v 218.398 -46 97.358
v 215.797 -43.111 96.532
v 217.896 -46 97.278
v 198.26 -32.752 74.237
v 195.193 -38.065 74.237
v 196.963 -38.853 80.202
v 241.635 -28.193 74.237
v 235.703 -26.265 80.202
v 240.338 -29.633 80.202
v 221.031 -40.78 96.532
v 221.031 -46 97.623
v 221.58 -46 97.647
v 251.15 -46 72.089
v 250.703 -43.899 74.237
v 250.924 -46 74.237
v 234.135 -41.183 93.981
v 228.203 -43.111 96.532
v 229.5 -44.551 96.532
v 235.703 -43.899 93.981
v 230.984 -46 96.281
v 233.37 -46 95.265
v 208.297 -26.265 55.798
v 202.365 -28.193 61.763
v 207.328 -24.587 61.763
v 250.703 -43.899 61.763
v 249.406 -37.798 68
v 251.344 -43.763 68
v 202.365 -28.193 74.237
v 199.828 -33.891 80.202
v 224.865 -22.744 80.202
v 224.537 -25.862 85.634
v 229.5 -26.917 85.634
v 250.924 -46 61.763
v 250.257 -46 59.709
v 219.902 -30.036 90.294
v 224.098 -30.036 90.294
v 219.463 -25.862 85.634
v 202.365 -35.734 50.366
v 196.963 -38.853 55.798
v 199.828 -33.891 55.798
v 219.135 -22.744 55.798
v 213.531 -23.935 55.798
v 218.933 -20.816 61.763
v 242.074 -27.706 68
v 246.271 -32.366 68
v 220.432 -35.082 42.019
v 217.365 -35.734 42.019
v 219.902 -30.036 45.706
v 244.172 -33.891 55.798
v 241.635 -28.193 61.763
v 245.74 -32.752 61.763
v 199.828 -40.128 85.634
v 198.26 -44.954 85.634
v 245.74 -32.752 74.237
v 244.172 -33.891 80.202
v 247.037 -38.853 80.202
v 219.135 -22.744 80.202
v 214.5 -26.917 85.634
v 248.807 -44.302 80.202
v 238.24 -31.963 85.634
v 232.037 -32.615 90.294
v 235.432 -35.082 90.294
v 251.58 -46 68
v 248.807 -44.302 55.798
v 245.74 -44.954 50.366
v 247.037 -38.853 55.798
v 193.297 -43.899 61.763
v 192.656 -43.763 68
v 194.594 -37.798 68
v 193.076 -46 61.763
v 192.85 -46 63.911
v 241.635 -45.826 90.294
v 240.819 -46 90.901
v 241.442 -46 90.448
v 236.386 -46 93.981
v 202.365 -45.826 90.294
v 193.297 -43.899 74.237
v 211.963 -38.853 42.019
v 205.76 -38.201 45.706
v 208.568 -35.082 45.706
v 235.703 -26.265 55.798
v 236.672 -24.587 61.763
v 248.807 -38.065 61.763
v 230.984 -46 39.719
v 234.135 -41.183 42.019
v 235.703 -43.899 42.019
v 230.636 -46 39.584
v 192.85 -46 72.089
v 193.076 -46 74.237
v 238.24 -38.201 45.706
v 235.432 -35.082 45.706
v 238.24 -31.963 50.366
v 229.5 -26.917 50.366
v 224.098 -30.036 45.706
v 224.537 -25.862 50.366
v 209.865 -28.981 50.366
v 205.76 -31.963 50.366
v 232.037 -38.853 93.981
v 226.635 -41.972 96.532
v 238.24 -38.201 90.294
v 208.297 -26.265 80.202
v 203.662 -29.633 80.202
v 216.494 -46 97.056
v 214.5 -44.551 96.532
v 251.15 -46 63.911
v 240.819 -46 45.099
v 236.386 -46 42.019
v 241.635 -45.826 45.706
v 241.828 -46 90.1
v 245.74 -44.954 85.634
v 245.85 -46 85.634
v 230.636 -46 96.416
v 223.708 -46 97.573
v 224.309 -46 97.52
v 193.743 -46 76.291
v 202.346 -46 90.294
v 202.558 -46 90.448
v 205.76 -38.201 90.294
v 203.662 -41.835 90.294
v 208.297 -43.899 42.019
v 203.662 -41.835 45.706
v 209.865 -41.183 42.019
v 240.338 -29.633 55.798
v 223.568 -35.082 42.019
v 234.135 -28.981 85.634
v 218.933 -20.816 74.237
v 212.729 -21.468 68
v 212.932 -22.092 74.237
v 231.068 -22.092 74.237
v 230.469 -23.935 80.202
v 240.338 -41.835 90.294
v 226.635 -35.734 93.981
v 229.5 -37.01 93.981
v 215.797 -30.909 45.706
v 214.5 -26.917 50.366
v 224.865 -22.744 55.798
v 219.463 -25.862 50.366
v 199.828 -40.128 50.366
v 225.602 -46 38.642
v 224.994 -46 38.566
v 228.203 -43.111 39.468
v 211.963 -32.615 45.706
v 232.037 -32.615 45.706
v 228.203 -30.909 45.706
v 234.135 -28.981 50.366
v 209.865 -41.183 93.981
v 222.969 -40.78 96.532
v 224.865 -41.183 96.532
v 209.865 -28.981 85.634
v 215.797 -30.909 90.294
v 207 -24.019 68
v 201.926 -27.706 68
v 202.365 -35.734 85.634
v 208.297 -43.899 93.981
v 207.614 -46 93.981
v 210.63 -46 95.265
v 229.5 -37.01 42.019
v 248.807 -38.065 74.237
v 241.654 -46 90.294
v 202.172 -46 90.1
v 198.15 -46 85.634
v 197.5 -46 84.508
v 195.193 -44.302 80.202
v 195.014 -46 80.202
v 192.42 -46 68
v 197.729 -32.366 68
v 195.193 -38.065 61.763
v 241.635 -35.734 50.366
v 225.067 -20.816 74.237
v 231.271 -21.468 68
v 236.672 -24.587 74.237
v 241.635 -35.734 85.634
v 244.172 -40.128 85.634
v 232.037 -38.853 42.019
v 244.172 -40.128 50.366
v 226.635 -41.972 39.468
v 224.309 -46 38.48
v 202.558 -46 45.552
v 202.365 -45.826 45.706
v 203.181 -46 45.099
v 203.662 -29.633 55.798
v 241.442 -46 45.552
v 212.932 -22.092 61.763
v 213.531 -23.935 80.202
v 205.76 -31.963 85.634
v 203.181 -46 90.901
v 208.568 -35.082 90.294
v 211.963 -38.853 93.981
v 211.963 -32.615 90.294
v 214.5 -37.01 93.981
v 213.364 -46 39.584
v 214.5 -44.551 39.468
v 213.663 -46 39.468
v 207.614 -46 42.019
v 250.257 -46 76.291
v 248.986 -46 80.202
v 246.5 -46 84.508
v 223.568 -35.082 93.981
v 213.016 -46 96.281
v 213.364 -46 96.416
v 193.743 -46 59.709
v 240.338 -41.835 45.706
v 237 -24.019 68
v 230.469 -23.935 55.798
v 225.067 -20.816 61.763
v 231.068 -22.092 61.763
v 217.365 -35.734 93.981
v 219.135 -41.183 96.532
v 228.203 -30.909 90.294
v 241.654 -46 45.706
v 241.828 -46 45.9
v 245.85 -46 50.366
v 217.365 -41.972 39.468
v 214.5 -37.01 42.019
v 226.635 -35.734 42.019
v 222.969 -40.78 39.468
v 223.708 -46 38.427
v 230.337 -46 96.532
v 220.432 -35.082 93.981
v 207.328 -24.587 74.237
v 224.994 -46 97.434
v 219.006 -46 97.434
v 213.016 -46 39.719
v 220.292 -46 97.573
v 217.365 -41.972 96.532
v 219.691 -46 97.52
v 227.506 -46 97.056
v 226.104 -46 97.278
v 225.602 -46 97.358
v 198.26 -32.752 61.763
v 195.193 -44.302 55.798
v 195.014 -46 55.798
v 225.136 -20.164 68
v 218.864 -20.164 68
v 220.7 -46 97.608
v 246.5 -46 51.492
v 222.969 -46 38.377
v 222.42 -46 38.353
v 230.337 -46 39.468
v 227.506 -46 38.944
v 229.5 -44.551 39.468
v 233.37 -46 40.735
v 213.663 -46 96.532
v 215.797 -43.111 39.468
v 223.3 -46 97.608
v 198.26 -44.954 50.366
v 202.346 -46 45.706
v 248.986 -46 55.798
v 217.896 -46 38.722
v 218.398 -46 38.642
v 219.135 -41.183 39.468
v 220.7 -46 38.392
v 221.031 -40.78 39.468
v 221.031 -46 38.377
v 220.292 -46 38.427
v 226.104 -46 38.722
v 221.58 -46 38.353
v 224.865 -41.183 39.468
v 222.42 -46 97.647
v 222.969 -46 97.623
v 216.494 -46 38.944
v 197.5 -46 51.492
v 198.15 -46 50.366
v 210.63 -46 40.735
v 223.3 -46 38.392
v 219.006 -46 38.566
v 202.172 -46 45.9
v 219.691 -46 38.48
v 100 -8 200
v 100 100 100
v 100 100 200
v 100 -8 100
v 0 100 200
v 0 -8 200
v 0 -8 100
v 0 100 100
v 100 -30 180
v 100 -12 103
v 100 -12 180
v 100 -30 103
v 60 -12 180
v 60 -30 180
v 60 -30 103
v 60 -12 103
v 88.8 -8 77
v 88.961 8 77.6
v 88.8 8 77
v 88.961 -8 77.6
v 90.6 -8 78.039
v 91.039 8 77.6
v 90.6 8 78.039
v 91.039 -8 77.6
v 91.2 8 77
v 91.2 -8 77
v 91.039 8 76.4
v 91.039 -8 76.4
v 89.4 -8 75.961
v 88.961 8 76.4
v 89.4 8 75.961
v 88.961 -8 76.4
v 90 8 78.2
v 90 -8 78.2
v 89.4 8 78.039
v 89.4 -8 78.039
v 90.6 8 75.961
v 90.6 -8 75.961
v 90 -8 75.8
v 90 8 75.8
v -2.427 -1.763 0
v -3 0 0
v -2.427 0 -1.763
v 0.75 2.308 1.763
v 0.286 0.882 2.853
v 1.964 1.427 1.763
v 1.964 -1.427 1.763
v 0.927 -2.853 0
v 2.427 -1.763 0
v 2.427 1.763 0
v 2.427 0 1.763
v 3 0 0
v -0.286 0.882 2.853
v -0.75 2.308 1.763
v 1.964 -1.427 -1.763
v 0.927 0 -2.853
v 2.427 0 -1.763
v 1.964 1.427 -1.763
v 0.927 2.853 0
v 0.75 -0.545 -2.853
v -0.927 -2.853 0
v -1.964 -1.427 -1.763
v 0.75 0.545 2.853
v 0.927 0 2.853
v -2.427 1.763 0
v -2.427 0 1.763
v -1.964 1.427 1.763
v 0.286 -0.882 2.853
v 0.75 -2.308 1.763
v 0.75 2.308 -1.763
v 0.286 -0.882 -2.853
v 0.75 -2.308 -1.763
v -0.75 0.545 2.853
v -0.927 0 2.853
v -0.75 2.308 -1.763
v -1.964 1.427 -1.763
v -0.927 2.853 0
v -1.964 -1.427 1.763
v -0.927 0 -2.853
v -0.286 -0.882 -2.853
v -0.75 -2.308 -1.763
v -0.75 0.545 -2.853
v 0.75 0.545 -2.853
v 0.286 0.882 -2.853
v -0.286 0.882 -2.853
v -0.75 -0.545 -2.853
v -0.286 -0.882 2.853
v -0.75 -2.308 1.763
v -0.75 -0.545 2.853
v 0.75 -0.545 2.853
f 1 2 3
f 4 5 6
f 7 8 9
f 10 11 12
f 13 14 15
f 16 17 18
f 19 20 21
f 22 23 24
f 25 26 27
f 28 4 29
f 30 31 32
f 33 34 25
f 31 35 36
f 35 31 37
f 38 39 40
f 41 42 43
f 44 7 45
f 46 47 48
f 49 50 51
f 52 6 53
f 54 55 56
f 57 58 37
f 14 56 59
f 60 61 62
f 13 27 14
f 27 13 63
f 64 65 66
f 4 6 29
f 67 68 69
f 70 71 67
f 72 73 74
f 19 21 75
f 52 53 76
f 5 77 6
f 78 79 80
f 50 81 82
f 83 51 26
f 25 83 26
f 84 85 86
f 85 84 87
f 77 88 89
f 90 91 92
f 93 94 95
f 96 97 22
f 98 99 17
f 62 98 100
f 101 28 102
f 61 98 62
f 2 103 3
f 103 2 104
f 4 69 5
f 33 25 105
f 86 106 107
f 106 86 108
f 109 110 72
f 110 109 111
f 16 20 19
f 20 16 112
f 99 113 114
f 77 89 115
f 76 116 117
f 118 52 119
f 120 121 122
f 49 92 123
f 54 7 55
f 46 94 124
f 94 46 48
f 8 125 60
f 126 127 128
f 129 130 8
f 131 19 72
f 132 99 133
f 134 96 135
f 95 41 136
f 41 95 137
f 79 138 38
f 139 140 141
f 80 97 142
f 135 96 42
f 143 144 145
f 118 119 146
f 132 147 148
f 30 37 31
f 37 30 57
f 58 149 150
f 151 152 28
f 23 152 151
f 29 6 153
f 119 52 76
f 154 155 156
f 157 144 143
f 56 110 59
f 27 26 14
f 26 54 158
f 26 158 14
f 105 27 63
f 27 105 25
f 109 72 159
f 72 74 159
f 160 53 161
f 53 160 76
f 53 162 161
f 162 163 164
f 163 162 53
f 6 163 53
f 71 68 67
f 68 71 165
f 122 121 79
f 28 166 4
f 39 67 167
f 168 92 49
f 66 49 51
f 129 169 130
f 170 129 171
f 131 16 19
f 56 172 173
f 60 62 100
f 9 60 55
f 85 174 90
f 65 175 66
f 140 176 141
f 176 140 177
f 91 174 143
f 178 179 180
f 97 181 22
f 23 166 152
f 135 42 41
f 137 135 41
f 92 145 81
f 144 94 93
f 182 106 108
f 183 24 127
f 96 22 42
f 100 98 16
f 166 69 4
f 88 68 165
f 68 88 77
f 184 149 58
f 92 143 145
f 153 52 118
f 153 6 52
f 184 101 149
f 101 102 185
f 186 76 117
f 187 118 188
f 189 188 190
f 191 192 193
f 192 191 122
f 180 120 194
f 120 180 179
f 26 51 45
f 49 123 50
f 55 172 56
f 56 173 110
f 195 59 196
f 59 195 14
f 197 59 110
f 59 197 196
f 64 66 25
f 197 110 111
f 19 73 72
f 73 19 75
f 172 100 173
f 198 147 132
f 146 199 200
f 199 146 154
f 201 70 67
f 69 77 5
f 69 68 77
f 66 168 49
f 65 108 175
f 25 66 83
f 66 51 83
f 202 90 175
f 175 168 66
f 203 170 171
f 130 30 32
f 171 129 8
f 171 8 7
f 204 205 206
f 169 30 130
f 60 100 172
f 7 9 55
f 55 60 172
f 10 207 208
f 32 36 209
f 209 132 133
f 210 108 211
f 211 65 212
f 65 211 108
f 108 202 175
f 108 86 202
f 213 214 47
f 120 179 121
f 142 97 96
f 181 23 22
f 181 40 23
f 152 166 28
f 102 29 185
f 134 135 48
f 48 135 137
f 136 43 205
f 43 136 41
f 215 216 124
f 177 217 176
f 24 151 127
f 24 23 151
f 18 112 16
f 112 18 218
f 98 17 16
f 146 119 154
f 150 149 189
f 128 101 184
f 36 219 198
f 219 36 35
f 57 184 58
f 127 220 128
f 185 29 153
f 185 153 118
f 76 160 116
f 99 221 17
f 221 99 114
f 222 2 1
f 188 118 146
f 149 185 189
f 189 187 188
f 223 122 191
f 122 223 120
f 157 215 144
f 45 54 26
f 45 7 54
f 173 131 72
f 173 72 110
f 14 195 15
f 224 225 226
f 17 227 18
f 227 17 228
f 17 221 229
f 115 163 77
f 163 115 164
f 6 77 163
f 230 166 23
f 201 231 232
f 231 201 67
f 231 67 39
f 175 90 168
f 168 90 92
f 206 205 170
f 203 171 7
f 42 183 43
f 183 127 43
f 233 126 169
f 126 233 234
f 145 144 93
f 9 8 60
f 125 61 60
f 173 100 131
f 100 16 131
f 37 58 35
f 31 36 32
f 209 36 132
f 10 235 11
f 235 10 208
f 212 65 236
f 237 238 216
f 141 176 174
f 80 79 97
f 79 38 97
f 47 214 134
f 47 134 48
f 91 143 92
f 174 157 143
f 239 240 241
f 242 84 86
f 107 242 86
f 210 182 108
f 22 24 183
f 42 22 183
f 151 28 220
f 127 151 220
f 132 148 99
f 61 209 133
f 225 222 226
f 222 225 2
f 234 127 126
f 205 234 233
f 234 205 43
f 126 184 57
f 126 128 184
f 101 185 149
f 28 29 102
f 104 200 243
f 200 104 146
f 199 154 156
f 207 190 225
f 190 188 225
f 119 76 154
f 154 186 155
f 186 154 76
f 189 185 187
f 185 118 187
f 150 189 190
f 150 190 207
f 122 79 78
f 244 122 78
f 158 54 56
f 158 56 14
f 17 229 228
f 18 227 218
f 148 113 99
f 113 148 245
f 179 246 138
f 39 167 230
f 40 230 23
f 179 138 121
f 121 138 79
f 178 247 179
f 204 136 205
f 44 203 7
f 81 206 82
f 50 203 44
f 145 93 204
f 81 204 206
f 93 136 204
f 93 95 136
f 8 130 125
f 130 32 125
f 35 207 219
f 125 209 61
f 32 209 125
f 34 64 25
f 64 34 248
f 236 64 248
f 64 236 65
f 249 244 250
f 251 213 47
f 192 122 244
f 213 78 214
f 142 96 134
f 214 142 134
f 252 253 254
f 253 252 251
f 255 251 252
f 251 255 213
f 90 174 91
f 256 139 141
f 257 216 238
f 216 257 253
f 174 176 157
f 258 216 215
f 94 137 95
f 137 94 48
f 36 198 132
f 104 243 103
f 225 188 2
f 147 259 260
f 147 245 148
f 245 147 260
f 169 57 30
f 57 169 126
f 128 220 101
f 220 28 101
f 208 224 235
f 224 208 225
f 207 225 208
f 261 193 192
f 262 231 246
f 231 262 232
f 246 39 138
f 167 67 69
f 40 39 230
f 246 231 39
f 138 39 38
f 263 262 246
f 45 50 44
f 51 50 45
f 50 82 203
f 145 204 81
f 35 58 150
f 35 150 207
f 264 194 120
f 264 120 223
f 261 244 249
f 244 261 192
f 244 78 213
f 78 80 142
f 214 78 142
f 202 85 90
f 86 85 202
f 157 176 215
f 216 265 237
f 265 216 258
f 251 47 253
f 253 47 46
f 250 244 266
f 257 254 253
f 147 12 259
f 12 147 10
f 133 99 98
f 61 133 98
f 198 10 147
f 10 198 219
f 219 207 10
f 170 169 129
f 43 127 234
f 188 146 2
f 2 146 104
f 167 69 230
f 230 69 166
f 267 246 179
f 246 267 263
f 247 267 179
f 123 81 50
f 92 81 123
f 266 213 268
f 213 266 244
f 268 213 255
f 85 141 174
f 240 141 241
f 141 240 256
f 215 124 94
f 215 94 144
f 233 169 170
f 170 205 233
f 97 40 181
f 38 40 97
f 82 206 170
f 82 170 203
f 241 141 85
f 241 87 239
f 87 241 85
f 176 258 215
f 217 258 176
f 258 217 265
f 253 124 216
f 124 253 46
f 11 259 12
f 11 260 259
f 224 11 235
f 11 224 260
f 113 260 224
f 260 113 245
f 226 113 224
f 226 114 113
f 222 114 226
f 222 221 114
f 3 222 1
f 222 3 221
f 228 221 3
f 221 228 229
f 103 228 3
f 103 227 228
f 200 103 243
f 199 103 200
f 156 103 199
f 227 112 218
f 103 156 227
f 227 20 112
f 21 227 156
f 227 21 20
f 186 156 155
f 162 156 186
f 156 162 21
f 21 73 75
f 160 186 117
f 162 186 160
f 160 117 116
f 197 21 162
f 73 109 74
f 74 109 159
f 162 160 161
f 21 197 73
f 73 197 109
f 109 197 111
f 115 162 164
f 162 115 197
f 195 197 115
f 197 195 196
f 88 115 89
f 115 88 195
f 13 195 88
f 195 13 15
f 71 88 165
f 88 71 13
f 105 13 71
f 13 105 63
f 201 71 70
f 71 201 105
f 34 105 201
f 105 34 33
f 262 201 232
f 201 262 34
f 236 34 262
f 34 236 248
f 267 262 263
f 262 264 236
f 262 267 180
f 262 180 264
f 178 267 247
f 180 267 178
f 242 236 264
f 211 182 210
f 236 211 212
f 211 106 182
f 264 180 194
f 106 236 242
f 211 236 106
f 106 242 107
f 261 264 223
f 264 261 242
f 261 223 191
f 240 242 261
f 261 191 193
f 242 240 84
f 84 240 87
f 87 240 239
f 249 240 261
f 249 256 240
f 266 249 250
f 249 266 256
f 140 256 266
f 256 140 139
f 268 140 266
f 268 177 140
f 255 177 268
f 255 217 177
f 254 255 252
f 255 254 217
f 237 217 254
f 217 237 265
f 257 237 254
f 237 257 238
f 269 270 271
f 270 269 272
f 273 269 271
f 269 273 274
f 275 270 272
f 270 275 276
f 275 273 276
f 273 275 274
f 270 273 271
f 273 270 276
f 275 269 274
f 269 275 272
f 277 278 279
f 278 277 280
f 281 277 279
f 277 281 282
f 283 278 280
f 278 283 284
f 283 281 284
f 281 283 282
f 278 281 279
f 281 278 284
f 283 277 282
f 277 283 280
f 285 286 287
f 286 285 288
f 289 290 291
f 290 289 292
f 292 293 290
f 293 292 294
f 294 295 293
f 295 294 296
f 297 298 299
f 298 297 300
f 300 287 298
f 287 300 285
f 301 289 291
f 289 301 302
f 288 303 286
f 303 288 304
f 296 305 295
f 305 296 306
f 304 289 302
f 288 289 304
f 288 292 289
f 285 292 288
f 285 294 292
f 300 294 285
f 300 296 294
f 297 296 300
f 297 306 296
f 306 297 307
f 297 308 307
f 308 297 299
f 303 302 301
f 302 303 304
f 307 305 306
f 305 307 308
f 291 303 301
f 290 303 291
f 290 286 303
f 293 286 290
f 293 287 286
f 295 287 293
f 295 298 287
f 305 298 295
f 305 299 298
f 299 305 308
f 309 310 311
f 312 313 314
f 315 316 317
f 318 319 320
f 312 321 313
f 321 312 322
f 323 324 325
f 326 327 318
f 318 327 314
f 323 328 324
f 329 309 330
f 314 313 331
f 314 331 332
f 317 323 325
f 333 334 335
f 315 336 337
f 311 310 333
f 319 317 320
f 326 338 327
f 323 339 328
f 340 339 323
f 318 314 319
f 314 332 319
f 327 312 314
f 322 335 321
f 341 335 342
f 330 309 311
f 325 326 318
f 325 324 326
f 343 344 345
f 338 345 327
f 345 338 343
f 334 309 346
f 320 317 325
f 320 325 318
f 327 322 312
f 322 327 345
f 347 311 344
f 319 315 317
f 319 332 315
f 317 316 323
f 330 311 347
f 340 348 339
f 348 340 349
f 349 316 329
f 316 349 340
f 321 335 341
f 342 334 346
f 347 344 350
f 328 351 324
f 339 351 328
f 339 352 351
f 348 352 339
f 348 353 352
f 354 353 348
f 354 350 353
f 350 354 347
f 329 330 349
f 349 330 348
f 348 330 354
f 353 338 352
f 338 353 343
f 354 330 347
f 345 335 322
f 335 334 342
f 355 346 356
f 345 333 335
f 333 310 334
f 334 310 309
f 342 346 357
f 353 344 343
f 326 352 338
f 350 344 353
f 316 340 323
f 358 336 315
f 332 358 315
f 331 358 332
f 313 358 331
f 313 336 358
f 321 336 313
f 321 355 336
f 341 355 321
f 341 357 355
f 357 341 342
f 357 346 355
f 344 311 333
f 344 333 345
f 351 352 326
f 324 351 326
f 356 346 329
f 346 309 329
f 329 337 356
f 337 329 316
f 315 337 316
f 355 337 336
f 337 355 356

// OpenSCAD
union() {
    // translate([298, -80.132698059082031, 164.12950134277344]) { // negative of position of terrain model in-world
    // //     translate([310, -85, 170]) {
    //     include <terrain-caves.scad>
    // }
    translate([0, -8, 100]) {
        cube([100 - 0, 100 - -8, 200 - 100], false);
    };
    translate([60, -30, 103]) {
        cube([100 - 60, -12 - -30, 180 - 103], false);
    };

    translate([222, -50, 68]) {
        difference() {
            sphere(30);
            translate([-50, -50, -50]) {
                cube([50 - -50, 4 - -50, 50 - -50], false);
            };

        }
    }

    // well
    translate([90, 0, 77]) {
        rotate([90, 0, 0]) {
            cylinder(h=16, r=1.2, center=true, $fn=12);
        }
    }

    // origin
    translate([0, 0, 0]) {
        sphere(3);
    }
}
